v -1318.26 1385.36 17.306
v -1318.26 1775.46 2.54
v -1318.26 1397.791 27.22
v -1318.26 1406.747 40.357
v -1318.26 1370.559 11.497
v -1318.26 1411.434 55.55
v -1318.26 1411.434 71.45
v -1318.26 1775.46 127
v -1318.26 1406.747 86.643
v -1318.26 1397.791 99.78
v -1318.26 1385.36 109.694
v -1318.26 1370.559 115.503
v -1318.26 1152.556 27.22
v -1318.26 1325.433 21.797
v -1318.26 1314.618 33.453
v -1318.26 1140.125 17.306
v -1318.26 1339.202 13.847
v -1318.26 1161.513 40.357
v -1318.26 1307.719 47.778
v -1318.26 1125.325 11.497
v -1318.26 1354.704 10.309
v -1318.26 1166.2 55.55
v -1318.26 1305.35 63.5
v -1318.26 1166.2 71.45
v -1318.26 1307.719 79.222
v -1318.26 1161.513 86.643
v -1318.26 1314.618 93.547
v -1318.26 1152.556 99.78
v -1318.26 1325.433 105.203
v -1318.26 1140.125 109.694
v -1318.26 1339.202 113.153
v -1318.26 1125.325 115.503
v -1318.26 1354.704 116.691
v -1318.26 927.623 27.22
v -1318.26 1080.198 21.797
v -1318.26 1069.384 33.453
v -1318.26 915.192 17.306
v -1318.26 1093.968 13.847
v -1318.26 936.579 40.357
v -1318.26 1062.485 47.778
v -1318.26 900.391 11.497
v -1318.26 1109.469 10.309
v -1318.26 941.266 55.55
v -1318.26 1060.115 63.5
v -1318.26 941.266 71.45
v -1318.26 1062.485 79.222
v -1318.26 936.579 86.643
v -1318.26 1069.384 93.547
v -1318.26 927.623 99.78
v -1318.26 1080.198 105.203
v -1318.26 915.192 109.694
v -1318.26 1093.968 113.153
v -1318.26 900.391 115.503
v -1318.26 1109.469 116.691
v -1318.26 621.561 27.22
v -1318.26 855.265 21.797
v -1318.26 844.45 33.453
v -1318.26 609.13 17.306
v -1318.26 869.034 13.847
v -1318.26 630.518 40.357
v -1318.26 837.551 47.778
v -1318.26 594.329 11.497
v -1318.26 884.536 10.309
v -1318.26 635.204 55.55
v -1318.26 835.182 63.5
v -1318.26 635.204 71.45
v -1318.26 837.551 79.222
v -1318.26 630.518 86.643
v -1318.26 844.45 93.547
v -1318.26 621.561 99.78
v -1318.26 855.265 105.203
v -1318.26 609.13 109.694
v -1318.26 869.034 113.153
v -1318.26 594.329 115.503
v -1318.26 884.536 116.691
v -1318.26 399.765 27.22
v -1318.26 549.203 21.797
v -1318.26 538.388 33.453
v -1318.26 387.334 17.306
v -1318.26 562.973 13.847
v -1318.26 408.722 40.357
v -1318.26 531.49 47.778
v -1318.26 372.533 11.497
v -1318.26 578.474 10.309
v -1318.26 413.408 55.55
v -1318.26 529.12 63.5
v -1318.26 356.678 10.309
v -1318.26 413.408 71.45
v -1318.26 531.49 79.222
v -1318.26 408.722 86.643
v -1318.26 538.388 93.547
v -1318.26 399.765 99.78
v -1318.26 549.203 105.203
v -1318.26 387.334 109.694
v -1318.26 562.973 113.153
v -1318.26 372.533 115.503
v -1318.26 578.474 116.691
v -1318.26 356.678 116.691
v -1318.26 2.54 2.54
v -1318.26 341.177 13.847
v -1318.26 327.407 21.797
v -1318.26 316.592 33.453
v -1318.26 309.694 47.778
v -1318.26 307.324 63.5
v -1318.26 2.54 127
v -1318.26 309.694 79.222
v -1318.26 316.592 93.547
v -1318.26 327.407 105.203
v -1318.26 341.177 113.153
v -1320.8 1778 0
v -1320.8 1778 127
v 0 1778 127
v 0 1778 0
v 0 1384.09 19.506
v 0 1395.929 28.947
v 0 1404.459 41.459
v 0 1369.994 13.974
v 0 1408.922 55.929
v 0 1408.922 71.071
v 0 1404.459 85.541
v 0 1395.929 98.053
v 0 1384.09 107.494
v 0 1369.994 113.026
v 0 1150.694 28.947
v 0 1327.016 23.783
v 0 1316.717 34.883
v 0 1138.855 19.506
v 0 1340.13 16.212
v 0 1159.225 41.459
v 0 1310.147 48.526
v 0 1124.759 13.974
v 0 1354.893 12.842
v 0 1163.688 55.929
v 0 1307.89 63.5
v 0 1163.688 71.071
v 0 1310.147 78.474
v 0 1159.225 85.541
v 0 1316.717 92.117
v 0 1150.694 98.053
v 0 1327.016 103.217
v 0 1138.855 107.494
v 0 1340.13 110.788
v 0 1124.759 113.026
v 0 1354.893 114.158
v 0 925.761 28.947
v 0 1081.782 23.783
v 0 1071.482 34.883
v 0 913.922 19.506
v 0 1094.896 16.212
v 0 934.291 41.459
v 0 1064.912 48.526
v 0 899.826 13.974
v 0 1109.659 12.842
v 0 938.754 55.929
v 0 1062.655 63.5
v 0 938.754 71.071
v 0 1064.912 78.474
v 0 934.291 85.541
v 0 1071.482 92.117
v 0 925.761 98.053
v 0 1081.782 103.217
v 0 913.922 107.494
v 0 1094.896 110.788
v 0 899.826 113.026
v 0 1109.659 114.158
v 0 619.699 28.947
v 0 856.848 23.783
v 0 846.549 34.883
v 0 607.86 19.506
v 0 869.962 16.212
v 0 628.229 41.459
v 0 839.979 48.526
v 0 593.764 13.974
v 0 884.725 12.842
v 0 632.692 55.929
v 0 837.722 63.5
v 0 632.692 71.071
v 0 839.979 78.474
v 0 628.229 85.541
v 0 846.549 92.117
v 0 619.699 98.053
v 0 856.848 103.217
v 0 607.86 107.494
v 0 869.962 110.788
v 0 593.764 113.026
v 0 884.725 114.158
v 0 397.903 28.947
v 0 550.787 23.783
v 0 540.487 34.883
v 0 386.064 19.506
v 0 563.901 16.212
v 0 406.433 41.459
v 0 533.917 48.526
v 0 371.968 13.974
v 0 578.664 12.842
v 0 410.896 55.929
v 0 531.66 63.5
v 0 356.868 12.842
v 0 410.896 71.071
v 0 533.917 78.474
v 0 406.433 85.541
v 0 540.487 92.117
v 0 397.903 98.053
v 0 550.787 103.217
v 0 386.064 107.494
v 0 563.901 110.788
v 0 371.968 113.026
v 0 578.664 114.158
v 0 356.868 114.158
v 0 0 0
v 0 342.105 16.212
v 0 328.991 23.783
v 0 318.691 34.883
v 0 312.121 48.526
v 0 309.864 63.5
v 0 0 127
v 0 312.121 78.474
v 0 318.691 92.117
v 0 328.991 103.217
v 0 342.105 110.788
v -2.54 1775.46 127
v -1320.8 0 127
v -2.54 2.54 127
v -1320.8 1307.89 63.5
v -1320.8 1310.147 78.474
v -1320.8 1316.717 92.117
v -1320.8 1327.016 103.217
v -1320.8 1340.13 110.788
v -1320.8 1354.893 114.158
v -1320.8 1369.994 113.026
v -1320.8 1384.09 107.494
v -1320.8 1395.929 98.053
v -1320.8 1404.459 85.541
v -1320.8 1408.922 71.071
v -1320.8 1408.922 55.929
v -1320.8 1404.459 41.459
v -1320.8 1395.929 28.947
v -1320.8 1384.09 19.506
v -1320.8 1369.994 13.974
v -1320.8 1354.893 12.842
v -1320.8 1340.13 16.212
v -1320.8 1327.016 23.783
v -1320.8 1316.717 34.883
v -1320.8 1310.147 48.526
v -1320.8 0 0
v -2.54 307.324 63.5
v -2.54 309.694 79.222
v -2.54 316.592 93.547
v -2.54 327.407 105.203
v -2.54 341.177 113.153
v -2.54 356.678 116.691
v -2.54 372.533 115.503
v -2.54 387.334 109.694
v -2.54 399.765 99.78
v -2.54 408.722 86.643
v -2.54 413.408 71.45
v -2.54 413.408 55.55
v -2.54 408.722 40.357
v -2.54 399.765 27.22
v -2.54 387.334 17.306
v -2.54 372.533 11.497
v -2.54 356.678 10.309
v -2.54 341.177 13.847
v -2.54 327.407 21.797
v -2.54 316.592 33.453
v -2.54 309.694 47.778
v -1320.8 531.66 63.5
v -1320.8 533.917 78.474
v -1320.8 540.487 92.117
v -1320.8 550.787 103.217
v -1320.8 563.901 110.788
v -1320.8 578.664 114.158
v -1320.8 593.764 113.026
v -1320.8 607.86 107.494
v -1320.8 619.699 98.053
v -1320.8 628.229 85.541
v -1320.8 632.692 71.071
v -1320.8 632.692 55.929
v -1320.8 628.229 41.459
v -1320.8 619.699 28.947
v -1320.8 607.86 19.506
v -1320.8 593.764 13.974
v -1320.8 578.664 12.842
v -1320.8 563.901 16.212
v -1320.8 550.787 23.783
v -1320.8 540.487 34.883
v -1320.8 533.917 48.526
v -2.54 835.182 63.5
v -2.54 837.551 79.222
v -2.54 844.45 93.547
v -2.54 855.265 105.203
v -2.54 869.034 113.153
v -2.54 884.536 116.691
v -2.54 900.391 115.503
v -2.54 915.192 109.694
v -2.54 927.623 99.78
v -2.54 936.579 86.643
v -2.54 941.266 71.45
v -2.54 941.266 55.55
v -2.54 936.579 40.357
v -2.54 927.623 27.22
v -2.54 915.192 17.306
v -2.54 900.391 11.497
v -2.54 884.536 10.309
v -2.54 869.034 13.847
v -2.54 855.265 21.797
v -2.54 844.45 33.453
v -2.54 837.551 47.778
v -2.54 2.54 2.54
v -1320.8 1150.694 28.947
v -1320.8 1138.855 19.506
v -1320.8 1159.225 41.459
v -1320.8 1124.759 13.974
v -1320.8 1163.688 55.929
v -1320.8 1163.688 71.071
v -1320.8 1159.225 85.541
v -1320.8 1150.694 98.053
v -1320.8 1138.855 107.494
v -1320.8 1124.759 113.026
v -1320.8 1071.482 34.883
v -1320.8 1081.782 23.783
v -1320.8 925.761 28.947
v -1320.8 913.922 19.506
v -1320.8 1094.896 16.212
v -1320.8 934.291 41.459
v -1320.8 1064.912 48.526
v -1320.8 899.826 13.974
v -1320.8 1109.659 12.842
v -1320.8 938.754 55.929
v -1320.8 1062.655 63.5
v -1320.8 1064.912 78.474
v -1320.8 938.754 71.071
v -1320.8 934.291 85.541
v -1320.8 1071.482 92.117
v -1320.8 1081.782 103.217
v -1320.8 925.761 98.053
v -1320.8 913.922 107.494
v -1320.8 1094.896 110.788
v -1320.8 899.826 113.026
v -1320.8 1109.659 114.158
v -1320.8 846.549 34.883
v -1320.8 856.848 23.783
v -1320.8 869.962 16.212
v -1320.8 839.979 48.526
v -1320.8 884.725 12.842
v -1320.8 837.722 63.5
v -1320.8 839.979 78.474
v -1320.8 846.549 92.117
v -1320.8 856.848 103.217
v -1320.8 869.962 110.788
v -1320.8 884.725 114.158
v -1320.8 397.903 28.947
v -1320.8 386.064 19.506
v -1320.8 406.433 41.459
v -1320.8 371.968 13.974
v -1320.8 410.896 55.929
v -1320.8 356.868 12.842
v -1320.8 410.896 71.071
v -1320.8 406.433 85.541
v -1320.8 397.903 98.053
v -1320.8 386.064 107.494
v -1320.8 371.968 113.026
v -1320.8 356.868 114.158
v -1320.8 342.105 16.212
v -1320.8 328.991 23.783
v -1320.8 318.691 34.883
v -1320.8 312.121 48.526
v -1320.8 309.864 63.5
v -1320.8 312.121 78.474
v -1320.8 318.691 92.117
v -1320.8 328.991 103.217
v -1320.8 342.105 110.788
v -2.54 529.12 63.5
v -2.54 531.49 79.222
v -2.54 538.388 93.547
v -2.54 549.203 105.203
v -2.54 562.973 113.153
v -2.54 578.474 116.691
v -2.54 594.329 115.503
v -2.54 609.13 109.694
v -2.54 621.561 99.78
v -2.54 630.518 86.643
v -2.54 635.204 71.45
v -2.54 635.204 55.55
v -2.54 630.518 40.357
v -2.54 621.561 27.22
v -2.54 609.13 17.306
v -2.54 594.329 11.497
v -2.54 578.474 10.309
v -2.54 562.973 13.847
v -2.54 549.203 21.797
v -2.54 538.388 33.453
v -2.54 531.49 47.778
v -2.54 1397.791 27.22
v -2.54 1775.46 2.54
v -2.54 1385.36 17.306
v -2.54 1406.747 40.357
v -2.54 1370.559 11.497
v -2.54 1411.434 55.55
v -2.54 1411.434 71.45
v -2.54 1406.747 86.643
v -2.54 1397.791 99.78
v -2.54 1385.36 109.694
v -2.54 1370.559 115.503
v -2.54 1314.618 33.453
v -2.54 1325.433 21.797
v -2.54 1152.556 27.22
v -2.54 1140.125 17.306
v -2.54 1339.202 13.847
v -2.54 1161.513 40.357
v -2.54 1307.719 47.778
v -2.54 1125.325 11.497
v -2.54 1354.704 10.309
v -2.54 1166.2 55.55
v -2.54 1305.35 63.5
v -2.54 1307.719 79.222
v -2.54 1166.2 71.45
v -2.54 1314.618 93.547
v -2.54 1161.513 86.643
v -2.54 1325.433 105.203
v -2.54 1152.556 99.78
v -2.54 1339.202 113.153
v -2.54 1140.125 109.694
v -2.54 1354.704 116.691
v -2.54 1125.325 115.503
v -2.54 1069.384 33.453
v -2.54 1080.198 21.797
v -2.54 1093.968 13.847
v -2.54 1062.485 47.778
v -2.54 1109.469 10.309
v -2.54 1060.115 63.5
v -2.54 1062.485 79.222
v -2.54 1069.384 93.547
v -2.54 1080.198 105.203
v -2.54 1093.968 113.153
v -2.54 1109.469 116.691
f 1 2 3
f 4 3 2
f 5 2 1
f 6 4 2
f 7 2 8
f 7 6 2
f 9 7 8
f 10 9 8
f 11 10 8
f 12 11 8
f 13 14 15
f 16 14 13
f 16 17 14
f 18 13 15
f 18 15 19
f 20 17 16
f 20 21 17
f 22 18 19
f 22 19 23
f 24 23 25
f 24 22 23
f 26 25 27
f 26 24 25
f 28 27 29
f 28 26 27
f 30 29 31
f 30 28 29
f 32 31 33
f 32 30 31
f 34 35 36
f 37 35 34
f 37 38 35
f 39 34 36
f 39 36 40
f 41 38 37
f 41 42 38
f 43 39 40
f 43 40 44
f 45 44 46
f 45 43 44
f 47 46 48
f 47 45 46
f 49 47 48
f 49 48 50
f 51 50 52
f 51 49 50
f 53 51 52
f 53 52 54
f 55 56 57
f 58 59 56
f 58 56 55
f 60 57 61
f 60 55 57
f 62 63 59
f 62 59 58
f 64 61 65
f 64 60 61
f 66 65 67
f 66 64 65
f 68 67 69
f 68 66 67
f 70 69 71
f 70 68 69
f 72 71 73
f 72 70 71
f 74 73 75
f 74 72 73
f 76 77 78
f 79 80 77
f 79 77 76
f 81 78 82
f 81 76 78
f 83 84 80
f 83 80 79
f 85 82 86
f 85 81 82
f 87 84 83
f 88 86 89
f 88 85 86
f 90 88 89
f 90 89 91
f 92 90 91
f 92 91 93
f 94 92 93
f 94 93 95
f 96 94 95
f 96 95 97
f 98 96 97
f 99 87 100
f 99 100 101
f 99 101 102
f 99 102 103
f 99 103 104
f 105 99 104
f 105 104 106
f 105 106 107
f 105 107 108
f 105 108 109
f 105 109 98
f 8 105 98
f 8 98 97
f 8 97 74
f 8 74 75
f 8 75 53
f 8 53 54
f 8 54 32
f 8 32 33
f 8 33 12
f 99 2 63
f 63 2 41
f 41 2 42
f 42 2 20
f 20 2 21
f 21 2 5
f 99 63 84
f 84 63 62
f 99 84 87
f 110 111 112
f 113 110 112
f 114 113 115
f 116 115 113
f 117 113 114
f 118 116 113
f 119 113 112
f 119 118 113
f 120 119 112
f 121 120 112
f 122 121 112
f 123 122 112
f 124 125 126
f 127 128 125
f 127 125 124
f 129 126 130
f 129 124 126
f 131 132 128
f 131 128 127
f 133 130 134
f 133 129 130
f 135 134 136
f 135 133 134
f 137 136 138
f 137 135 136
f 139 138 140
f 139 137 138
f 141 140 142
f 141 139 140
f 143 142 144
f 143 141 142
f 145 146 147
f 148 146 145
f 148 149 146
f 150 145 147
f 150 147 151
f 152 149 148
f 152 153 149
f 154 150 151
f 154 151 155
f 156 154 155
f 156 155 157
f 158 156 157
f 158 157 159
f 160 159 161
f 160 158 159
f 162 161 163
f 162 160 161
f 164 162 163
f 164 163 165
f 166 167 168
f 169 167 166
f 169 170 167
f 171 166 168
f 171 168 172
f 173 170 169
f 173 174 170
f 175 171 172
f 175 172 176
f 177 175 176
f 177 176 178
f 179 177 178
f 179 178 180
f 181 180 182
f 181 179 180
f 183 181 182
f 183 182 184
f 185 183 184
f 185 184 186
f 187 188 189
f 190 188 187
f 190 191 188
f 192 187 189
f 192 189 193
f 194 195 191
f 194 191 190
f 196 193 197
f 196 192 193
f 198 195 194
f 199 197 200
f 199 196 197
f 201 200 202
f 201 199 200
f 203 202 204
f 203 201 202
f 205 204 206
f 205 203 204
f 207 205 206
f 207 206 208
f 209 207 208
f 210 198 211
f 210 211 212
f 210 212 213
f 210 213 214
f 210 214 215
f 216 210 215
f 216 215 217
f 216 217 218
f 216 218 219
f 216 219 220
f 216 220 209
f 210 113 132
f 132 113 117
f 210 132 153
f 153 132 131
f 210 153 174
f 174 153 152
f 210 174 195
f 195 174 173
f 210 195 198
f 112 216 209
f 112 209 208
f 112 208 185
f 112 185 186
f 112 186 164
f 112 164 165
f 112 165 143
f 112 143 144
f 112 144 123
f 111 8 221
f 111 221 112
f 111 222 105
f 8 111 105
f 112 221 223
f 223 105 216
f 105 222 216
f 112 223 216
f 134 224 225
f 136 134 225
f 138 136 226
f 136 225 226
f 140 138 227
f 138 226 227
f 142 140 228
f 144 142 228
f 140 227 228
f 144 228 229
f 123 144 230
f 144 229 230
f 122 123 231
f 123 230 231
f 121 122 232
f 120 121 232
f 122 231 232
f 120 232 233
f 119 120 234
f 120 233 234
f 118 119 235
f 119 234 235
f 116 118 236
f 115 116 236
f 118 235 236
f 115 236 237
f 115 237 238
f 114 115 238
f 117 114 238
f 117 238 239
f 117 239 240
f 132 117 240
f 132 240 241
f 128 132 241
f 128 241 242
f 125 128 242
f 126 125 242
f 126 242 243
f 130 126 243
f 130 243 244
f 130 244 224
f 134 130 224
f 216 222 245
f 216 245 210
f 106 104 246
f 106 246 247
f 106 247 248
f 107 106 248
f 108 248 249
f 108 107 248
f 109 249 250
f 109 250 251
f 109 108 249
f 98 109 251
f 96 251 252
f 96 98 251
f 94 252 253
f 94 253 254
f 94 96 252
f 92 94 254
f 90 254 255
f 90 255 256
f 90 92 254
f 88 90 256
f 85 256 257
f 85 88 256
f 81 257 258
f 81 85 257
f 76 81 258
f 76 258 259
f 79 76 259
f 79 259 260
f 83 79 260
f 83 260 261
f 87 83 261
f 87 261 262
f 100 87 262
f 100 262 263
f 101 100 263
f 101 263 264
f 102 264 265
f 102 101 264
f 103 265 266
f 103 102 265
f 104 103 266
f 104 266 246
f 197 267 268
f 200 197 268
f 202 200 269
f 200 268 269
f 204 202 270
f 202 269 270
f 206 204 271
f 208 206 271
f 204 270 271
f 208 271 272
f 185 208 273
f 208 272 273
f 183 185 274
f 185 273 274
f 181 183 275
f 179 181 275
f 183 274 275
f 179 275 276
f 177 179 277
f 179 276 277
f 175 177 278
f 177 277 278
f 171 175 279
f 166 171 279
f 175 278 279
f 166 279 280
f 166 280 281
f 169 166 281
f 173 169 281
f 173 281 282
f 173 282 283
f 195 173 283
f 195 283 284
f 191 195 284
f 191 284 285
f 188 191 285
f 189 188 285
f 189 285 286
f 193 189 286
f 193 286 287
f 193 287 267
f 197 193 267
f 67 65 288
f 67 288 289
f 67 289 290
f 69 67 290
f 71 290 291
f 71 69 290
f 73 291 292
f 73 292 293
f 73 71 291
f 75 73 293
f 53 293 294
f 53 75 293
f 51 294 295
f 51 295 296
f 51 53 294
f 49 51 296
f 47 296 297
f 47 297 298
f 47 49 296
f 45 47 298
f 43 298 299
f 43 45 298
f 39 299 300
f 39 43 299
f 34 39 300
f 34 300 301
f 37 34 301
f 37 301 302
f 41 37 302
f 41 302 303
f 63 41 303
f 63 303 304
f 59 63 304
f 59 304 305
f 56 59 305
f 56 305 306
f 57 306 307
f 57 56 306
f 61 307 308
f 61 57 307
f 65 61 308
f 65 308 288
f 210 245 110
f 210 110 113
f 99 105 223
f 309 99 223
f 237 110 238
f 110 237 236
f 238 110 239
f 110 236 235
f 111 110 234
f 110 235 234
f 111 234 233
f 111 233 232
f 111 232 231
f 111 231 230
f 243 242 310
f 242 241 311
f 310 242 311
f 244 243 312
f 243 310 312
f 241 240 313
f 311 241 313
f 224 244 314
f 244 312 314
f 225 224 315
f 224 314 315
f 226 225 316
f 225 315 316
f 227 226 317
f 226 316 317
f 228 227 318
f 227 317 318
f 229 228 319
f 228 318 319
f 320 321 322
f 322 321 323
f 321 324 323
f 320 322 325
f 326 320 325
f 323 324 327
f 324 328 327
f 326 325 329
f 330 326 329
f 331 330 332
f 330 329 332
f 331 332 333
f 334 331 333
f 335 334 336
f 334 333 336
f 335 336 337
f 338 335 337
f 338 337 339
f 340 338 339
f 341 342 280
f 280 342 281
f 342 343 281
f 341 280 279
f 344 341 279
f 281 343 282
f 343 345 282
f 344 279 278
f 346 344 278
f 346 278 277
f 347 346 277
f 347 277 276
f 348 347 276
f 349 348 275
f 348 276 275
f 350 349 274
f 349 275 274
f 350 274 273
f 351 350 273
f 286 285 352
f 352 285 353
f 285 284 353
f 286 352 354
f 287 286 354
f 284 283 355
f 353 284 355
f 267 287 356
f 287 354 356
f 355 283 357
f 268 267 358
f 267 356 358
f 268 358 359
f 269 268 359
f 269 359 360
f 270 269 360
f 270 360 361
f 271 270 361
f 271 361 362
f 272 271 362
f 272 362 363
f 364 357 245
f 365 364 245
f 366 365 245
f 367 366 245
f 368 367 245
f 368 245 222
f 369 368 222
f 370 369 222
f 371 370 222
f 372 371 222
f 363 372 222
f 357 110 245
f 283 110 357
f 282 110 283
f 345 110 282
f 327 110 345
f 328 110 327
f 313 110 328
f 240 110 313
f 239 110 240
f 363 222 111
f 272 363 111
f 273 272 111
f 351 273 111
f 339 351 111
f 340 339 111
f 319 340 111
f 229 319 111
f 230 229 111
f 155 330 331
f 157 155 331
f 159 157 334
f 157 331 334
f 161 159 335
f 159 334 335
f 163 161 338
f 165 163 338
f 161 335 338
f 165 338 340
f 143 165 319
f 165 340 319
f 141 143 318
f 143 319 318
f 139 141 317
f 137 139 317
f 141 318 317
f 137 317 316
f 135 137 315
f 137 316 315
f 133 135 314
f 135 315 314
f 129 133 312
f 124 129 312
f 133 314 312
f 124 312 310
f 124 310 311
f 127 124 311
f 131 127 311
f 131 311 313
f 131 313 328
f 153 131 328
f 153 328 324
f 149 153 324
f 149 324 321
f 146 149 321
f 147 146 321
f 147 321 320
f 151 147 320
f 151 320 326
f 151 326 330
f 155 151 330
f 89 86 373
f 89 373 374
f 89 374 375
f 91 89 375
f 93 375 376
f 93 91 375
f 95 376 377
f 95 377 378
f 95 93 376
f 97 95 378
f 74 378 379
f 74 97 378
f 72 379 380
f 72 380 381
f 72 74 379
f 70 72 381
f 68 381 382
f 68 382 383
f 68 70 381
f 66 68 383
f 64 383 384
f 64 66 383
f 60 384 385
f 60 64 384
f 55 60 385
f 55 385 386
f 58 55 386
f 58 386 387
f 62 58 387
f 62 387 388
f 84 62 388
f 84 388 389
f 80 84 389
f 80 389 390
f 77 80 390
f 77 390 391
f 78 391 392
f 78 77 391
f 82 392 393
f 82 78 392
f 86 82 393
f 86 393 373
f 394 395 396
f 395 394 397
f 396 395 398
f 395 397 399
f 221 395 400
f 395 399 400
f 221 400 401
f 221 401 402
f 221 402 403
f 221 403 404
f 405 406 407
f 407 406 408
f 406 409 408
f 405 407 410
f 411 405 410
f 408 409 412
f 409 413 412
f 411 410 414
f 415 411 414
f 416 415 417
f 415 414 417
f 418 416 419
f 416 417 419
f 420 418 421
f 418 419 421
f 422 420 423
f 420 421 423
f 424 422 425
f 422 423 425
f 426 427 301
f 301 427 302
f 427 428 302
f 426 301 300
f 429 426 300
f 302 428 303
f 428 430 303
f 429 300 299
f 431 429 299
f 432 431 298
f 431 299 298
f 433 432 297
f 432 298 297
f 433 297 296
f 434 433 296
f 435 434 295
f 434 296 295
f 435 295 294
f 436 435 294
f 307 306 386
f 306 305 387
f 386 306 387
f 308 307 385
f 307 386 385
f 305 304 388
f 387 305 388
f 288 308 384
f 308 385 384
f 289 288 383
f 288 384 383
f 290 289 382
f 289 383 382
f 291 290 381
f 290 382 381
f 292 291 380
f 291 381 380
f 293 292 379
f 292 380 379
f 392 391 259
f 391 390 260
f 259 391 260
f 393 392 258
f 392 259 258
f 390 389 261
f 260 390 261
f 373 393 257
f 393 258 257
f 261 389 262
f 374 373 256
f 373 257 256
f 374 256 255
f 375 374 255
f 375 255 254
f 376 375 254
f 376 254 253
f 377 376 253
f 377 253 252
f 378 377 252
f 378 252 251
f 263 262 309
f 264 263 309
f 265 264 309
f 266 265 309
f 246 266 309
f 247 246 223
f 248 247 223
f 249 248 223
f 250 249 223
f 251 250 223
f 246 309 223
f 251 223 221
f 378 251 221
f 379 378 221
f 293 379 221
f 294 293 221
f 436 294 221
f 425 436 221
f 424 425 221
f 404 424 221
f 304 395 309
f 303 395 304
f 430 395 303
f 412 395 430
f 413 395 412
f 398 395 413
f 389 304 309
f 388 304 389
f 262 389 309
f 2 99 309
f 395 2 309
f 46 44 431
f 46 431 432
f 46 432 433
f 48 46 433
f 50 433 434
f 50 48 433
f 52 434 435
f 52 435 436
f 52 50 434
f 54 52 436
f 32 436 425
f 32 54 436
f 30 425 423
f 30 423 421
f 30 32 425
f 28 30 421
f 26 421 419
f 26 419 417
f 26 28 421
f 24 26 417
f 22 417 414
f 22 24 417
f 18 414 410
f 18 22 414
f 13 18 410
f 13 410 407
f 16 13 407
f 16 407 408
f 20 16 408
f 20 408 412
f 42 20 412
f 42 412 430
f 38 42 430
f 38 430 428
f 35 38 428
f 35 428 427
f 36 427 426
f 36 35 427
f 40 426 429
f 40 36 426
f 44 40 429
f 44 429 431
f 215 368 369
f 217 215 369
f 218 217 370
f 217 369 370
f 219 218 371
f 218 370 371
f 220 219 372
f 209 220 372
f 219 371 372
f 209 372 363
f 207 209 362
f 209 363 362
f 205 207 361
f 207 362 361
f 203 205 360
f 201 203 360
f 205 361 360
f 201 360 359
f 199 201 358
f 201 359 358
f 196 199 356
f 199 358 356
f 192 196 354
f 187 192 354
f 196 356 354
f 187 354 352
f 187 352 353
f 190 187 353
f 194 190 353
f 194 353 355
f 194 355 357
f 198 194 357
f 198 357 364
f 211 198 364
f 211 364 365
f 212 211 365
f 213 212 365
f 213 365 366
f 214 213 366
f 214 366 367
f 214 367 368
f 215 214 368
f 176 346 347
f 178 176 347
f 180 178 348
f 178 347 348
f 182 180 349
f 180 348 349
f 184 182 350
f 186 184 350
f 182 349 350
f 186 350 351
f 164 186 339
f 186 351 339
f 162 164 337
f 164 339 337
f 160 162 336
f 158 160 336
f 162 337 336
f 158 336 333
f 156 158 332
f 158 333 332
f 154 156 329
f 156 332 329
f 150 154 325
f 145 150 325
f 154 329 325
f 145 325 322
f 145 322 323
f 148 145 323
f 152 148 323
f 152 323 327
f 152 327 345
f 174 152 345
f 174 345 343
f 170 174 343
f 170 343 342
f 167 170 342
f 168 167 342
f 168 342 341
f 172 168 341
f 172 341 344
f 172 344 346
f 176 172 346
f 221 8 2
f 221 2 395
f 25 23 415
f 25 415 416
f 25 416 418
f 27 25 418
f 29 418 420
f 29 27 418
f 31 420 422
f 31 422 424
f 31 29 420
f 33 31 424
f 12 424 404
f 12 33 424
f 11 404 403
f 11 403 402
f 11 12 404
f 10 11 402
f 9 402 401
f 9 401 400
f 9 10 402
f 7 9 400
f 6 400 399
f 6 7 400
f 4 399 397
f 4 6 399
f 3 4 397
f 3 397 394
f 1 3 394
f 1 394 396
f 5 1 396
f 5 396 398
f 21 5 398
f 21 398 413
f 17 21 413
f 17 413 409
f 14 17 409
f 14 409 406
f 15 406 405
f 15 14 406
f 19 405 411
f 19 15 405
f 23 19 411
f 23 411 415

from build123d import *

# Parameters (mm, degrees)
F0_W     = 1320.8
F0_H     = 127
F1_DEPTH = 1778
F2_R     = 50.8
F3_DEPTH = 1465.58
F4_T     = -2.54


with BuildPart() as f1:
    # F0 (on Front) → F1 (new body)
    with BuildSketch(Plane.XZ):
        with Locations((-660.4, 63.5)):
            Rectangle(F0_W, F0_H)
    extrude(amount=-F1_DEPTH)

    # F2 (on face) → F3 (cut)
    with BuildSketch(Plane(origin=(-1320.8, 0, 0), x_dir=(0, -1, 0), z_dir=(-1, 0, 0))):
        with Locations((-1358.689666, 63.5)):
            Circle(F2_R)
        with Locations((-888.521751, 63.5)):
            Circle(F2_R)
        with Locations((-360.66384, 63.5)):
            Circle(F2_R)
        with Locations((-582.459867, 63.5)):
            Circle(F2_R)
        with Locations((-1113.455415, 63.5)):
            Circle(F2_R)
    extrude(amount=-F3_DEPTH, mode=Mode.SUBTRACT)

    # F4
    f4_openings = [f1.faces().sort_by_distance(p)[0] for p in [
        (-660.4, 889, 127),
    ]]
    offset(amount=F4_T, openings=f4_openings)


solid = f1.part
